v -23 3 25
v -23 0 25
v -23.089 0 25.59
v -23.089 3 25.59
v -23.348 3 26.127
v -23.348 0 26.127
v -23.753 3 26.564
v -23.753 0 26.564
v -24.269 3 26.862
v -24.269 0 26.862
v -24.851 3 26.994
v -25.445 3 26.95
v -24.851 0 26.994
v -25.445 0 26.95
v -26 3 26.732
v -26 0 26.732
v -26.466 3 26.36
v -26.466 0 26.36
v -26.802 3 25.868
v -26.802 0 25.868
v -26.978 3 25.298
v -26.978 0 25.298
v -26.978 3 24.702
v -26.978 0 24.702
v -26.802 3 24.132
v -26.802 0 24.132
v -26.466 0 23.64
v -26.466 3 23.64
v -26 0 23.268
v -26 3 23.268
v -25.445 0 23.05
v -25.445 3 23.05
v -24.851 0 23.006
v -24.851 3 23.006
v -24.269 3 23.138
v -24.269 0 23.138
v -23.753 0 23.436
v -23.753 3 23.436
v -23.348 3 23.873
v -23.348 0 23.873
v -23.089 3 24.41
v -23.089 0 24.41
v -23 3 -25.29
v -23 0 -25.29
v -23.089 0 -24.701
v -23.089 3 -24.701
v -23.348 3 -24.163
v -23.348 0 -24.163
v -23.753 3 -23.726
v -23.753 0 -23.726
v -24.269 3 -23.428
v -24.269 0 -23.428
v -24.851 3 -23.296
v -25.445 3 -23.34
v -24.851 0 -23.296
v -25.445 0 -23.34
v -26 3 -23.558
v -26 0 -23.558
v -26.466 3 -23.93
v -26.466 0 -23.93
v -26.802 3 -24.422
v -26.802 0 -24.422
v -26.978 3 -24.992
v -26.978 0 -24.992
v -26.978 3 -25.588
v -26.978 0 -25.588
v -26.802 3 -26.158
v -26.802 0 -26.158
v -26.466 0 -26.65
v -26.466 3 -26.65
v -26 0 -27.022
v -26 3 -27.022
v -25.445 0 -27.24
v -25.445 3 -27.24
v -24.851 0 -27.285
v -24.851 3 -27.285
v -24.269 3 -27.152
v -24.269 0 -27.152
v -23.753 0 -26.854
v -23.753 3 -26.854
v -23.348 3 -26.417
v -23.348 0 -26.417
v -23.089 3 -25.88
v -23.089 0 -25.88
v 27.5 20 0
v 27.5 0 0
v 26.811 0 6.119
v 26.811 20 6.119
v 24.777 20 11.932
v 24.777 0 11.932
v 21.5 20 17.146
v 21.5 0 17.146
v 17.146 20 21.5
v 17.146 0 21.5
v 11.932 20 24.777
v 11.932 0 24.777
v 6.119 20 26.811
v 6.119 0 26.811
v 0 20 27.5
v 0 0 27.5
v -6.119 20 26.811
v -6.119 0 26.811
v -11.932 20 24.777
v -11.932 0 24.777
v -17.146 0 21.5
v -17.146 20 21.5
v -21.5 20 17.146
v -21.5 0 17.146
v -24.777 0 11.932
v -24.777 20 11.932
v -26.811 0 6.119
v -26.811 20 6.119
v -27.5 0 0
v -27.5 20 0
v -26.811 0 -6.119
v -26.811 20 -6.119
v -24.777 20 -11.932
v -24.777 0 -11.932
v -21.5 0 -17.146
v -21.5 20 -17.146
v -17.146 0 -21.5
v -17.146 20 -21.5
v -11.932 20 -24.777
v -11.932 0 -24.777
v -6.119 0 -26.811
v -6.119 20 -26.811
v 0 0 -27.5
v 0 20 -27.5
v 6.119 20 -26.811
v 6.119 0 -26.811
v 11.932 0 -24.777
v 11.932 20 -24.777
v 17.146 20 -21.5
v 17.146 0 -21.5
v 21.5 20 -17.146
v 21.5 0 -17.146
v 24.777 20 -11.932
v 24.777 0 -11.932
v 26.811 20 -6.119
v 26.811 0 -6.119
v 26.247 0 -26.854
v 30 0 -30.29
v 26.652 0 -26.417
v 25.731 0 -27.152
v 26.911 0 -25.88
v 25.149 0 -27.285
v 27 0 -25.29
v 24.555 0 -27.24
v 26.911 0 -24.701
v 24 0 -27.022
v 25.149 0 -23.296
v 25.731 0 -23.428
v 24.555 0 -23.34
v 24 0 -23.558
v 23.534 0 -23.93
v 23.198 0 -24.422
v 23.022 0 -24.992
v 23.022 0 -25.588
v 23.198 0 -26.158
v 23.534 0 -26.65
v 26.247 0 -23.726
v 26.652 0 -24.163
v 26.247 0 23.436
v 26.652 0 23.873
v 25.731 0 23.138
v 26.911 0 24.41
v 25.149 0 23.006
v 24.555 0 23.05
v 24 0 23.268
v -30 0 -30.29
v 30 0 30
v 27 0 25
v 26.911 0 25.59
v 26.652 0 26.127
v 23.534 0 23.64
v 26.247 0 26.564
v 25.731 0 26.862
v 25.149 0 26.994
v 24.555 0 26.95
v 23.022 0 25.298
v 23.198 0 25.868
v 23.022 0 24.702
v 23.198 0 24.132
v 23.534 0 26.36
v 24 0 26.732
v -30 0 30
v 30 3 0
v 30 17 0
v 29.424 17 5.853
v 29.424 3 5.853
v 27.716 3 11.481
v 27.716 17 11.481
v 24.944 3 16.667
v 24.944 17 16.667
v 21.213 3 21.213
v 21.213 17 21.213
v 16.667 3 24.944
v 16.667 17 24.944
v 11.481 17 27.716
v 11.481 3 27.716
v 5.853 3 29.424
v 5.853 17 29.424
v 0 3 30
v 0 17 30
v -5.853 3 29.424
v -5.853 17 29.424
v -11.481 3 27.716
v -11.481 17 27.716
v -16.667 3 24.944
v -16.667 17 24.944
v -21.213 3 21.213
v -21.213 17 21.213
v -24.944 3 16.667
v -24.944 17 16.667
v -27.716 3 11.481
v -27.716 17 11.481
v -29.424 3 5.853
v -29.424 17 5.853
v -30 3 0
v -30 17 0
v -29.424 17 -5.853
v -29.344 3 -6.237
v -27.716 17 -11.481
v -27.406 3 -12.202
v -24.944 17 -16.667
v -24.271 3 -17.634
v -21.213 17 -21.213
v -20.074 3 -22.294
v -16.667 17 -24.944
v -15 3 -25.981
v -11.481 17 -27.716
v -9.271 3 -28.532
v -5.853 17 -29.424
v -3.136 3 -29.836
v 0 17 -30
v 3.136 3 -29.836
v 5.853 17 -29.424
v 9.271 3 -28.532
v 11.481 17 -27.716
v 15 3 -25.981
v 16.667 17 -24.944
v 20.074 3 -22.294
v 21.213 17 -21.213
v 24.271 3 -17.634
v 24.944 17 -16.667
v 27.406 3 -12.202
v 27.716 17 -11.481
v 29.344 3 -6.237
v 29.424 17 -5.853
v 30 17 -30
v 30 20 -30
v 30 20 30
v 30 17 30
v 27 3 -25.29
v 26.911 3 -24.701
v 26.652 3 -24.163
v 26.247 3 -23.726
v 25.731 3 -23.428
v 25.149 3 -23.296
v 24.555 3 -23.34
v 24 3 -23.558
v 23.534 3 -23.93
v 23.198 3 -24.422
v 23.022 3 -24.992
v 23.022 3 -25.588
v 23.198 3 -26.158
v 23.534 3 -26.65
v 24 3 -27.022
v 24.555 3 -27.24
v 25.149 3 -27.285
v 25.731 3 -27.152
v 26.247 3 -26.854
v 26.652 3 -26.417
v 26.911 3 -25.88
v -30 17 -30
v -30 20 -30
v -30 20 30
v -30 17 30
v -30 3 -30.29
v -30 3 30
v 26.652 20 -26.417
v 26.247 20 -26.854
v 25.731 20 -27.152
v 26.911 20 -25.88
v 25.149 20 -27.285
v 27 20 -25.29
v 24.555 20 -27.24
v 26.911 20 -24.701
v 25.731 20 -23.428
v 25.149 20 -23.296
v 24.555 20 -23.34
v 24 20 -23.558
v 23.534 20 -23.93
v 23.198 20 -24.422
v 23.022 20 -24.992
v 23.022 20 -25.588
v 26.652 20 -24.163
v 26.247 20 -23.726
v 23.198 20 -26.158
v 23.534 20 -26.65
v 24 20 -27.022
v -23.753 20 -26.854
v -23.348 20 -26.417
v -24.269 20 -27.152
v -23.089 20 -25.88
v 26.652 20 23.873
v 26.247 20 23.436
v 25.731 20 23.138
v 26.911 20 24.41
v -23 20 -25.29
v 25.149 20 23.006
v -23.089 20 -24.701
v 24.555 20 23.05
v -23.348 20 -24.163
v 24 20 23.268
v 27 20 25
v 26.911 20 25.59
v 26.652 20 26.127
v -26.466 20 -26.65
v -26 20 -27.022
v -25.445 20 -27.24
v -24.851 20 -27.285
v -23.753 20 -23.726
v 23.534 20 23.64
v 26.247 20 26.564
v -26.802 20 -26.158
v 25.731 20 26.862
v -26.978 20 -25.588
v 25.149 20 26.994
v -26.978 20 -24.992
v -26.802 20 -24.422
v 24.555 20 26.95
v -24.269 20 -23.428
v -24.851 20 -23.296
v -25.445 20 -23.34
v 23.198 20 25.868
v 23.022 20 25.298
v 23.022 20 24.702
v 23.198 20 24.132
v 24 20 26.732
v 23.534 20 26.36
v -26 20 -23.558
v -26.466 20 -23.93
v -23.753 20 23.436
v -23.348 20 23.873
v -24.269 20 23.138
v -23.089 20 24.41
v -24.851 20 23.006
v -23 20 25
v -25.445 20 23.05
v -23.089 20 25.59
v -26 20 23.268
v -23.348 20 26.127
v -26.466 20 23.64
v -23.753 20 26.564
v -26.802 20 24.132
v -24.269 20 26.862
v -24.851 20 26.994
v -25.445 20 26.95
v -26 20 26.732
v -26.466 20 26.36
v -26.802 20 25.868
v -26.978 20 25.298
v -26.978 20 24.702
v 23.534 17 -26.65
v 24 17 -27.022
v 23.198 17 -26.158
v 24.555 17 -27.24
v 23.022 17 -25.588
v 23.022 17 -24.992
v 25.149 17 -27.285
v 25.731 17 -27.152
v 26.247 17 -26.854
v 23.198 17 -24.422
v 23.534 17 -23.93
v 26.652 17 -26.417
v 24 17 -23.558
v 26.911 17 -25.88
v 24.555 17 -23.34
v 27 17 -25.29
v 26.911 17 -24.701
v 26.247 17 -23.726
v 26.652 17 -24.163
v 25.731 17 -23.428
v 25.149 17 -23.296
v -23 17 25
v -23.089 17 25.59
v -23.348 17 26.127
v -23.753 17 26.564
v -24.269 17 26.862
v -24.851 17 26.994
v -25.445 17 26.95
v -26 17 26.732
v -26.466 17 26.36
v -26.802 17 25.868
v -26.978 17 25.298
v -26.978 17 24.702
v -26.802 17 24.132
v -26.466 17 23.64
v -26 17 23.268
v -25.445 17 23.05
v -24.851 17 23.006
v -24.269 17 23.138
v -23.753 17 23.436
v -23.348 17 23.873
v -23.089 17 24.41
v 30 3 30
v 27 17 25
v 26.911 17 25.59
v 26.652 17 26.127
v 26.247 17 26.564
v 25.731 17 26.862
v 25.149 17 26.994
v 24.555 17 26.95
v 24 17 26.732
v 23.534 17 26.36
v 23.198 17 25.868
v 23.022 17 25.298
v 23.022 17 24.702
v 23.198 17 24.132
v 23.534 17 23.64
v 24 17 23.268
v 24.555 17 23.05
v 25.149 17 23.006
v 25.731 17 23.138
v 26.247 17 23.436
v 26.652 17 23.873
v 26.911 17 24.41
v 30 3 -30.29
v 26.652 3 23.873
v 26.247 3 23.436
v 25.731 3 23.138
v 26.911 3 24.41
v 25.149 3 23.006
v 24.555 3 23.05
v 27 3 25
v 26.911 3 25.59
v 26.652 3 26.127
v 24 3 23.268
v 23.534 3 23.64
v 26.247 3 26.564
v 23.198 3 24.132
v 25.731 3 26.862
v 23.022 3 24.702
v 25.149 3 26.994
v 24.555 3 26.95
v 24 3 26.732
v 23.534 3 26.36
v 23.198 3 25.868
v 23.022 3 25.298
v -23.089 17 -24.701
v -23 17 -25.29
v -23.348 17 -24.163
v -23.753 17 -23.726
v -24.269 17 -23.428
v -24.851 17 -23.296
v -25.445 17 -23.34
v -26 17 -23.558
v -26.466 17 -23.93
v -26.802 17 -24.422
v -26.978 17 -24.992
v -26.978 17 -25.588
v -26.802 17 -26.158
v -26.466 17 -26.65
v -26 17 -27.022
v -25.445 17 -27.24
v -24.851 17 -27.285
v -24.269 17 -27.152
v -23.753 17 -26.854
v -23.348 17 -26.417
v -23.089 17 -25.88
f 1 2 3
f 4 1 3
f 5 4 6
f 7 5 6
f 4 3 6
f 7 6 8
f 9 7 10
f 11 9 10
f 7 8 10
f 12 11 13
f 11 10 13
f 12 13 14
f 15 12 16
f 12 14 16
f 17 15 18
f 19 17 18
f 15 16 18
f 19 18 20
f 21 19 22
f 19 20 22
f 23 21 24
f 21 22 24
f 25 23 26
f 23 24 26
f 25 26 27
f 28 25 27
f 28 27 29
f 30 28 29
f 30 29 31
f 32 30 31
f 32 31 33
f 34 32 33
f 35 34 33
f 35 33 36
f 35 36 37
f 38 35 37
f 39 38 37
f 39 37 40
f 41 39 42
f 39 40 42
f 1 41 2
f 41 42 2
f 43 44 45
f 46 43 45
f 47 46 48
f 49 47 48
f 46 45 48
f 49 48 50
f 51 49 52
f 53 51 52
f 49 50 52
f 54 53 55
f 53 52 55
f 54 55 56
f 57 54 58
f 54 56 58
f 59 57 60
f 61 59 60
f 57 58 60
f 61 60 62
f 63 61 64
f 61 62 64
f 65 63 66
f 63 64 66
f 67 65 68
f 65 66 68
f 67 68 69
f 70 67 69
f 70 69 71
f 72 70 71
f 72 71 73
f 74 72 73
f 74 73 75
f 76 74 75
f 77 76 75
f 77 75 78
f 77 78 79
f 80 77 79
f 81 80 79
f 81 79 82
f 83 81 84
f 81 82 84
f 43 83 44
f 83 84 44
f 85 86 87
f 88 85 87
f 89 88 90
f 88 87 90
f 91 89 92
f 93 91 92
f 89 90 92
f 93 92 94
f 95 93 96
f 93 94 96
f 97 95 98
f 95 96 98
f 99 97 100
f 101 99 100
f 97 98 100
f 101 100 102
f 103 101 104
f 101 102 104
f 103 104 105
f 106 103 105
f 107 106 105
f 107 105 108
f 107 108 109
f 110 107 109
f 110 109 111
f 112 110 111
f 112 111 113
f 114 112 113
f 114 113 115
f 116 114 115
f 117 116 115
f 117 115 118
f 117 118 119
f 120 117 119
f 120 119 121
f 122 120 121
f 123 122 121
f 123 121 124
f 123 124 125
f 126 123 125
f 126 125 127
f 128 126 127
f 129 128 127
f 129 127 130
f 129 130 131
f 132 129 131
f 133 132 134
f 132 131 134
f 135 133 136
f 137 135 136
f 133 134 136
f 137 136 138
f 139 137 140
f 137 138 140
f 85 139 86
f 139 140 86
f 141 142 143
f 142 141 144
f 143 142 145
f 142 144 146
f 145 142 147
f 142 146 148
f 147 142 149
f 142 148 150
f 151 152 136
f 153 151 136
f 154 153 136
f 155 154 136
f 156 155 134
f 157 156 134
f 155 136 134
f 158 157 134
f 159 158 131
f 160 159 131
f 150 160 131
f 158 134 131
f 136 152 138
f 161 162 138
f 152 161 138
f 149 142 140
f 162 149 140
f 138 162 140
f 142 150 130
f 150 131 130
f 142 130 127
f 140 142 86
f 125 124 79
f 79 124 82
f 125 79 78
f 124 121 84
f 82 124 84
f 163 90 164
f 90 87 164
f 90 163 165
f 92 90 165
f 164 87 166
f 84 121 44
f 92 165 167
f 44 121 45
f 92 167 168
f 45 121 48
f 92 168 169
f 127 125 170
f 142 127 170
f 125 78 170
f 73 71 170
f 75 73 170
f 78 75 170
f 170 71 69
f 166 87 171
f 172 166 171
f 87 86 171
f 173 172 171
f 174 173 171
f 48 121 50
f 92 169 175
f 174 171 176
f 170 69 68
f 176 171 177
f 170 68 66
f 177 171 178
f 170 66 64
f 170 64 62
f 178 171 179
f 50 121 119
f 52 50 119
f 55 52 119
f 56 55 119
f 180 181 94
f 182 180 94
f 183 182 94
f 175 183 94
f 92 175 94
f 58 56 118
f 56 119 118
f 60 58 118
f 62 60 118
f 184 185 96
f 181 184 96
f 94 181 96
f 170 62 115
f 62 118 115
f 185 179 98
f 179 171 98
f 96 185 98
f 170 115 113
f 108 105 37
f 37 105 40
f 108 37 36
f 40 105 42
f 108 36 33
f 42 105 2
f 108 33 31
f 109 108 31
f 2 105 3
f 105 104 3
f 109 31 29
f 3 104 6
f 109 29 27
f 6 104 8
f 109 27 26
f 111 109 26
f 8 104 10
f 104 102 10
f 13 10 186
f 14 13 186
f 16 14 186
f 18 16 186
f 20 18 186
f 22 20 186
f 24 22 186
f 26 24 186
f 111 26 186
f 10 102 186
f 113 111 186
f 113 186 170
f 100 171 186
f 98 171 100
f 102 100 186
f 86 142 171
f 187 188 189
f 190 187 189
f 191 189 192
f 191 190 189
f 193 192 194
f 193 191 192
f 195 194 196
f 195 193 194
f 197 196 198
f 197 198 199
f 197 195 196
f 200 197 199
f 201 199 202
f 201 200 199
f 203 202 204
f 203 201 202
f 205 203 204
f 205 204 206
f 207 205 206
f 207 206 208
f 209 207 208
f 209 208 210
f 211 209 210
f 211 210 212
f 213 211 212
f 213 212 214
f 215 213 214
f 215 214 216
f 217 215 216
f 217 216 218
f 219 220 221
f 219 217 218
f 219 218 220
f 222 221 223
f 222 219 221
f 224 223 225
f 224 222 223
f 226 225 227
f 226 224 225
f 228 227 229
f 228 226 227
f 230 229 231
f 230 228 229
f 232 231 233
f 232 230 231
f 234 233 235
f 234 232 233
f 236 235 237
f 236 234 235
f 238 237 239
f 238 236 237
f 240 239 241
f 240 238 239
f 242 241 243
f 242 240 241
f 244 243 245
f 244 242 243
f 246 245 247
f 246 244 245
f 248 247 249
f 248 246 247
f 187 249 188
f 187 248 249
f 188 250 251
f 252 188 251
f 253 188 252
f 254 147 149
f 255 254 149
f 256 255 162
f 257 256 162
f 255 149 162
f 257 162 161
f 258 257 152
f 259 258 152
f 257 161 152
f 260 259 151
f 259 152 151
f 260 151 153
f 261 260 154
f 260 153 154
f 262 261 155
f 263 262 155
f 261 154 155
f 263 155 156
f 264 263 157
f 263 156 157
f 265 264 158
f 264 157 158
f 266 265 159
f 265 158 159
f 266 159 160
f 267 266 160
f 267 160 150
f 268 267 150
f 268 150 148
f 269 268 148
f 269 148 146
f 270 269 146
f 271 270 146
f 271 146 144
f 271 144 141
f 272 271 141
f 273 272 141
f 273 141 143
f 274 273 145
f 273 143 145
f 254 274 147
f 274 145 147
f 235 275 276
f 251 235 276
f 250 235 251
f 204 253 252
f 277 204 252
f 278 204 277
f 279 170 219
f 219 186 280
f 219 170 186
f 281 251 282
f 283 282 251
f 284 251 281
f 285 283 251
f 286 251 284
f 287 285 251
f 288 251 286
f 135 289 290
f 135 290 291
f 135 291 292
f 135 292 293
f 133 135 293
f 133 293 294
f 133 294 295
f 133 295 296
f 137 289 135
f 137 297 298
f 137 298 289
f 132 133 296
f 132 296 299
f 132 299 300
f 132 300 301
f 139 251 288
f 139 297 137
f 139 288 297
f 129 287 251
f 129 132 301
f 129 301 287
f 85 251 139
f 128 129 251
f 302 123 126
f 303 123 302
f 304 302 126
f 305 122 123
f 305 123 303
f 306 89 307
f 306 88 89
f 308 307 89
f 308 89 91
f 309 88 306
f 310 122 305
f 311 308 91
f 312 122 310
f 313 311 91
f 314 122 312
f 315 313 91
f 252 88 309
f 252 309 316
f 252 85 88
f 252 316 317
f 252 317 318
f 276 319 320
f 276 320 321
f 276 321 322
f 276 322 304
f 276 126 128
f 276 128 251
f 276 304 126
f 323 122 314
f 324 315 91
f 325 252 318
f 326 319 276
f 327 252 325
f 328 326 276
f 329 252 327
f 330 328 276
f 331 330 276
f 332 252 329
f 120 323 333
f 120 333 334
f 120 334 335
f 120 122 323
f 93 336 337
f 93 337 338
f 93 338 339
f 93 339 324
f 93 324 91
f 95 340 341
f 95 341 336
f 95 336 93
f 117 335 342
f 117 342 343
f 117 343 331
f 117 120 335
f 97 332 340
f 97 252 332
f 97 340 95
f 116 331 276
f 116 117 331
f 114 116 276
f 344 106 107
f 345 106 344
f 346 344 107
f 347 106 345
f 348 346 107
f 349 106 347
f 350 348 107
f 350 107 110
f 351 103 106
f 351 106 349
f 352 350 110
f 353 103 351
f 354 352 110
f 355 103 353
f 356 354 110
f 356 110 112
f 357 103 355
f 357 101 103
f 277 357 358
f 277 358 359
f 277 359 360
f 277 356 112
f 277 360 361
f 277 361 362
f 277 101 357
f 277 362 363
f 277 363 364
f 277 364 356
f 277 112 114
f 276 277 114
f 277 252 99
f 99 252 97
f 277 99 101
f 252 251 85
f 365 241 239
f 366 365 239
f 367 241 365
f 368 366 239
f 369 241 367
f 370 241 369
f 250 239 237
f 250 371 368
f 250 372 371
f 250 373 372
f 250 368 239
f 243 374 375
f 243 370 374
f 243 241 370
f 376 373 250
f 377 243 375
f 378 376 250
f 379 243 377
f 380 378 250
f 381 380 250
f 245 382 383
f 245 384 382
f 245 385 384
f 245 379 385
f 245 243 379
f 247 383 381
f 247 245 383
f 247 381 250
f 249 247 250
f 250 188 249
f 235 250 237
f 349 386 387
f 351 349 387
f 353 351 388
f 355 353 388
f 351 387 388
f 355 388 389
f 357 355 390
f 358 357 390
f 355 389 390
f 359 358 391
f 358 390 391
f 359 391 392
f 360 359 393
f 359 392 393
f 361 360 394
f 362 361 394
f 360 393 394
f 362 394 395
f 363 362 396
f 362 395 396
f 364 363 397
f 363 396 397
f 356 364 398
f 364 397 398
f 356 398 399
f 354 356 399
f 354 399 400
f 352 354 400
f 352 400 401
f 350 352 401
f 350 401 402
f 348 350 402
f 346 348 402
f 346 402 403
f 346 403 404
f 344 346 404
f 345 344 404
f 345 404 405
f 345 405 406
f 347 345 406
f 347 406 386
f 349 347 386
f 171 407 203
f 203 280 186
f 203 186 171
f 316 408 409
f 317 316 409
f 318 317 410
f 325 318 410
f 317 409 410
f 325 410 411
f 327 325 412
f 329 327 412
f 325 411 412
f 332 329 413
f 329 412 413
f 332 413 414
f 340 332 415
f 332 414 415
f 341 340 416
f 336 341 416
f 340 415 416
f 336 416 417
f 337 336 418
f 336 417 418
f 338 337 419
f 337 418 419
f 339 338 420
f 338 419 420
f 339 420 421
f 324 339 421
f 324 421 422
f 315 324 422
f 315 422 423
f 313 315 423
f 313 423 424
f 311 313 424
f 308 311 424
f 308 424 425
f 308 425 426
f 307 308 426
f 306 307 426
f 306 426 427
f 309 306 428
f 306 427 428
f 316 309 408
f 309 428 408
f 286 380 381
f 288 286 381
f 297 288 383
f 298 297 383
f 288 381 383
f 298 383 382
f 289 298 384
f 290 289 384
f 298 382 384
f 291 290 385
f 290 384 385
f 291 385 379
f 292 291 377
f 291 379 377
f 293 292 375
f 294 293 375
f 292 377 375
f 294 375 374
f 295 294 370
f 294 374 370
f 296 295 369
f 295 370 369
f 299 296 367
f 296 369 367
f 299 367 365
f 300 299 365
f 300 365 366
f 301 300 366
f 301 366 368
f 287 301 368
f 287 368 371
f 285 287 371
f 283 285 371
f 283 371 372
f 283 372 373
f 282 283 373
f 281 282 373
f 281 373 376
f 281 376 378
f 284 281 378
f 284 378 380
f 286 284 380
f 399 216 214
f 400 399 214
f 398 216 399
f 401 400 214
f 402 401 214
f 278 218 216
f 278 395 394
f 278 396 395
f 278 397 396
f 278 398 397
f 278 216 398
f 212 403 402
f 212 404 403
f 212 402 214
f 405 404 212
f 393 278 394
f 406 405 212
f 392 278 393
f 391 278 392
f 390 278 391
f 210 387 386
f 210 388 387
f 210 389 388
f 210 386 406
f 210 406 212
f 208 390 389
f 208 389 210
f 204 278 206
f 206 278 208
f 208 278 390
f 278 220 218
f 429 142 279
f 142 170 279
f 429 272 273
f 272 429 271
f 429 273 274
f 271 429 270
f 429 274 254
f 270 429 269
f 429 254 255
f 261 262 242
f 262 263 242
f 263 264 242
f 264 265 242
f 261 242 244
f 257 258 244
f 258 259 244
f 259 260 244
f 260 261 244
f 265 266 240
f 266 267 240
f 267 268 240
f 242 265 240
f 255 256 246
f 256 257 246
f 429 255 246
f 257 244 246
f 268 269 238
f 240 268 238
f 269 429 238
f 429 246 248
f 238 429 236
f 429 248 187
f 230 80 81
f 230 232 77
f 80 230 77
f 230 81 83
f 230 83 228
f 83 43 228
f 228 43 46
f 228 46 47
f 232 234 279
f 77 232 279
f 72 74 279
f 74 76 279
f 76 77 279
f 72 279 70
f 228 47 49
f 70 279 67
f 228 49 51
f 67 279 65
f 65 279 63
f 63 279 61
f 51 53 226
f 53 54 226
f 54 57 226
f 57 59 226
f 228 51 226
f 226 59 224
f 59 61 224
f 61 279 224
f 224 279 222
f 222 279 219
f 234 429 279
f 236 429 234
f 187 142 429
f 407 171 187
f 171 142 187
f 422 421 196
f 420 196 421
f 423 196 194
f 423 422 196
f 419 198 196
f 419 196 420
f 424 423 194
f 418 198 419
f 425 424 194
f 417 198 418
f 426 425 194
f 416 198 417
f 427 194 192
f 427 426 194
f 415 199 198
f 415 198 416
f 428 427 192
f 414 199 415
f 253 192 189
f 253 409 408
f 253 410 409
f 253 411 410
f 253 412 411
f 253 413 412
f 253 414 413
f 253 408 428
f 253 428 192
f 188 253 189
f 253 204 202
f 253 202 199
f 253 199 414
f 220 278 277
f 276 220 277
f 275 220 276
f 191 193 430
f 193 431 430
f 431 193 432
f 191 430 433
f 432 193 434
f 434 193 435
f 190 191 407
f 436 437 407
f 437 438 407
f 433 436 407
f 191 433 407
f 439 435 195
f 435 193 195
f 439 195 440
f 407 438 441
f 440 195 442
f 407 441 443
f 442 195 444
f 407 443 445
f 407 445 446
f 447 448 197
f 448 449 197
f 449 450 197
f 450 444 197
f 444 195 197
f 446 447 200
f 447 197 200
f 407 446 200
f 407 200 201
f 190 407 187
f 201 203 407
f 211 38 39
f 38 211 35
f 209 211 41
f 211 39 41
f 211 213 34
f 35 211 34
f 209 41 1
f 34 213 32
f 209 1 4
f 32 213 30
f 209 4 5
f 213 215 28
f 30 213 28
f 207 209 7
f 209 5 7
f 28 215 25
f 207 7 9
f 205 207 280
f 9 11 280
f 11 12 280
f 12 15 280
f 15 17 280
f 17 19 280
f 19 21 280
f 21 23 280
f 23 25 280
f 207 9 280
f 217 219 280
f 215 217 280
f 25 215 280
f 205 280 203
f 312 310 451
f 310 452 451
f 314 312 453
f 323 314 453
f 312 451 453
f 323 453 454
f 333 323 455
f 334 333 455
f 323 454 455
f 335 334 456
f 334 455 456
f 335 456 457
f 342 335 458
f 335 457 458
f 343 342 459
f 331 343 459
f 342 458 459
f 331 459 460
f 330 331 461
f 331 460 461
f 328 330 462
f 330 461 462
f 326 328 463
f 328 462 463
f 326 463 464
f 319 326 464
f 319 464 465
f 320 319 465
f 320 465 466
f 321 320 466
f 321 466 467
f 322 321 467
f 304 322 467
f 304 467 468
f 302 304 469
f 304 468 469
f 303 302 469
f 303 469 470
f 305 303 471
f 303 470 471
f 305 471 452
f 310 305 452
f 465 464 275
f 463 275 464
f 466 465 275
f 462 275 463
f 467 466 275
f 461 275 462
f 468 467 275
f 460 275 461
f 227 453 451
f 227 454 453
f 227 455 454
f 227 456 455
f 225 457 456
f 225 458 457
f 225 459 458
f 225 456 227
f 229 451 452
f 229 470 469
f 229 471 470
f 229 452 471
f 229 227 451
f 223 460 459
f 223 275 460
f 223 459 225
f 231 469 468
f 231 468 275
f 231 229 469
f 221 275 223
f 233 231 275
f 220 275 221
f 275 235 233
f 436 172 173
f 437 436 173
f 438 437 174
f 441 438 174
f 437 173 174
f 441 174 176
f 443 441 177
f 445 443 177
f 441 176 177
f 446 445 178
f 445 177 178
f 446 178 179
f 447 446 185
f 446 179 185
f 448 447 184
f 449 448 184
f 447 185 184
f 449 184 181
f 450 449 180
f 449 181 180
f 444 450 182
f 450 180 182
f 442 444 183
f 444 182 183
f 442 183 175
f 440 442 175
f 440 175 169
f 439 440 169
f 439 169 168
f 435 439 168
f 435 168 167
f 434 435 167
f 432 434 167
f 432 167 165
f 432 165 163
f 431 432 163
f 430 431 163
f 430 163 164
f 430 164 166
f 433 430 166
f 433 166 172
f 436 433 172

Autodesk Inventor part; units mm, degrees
ref_plane "YZ Plane" through (0, 0, 0) normal (1, 0, 0) x (0, 1, 0)
ref_plane "XZ Plane" through (0, 0, 0) normal (0, 1, 0) x (-1, 0, 0)
ref_plane "XY Plane" through (0, 0, 0) normal (0, 0, 1) x (1, 0, 0)
sketch "Sketch1" plane through (0, 0, 0) normal (0, 1, 0) x (-1, 0, 0)
  line L0 (30, -30) -> (-30, -30)
  line L1 (-30, -30) -> (-30, 30)
  line L2 (-30, 30) -> (30, 30)
  line L3 (30, 30) -> (30, -30)
  line L4 (30, -30) -> (-30, 30) construction
  line L5 (-30, -30) -> (30, 30) construction
  point P0 (0, 0)
  dimension "d0" = 60
  dimension "d1" = 60
extrude "Extrusion1" add sketch "Sketch1" along normal blind 20
sketch "Sketch2" plane through (0, 0, 0) normal (0, -1, 0) x (1, 0, 0)
  circle A0 centre (0, 0) radius 27.5
  dimension "d4" = 55
extrude "Extrusion2" cut sketch "Sketch2" against normal blind 20
sketch "Sketch3" plane through (0, 0, 0) normal (0, -1, 0) x (1, 0, 0)
  circle A0 centre (0, 0) radius 30
  line L0 (-30, -30) -> (30, -30)
  line L1 (30, -30) -> (30, 30)
  line L2 (30, 30) -> (-30, 30)
  line L3 (-30, 30) -> (-30, -30)
  line L4 (-30, -30) -> (30, 30) construction
  line L5 (30, -30) -> (-30, 30) construction
extrude "Extrusion3" cut sketch "Sketch3" against normal blind 17 contours L1 L0 A0 | A0 L2 L1 | A0 L3 L2 | L0 L3 A0
sketch "Sketch4" plane through (0, 0, 0) normal (1, 0, 0) x (0, 1, 0)
  line L0 (0, 30) -> (0, -30) projected
  line L1 (0, -30.2901) -> (3, -30.2901)
  line L2 (3, -30.2901) -> (3, 30)
  line L3 (3, 30) -> (0, 30)
  line L4 (0, 30) -> (0, -30.2901)
  point P0 (0, 0)
  dimension "d9" = 3
extrude "Extrusion4" add sketch "Sketch4" along normal mid plane 60
sketch "Sketch5" plane through (0, 0, 0) normal (0, -1, 0) x (1, 0, 0)
  circle A0 centre (0, 0) radius 27.5
extrude "Extrusion5" cut sketch "Sketch5" against normal blind 60
sketch "Sketch6" plane through (0, 0, 0) normal (0, -1, 0) x (1, 0, 0)
  circle A0 centre (25, -25.2901) radius 2
  circle A1 centre (-25, -25.2901) radius 2
  circle A2 centre (-25, 25) radius 2
  circle A3 centre (25, 25) radius 2
  line L0 (30, 30) -> (30, -30.2901) projected
  line L1 (-30, 30) -> (30, 30) projected
  line L2 (30, -30.2901) -> (-30, -30.2901) projected
  line L3 (-30, -30.2901) -> (-30, 30) projected
  point P0 (0, 0)
  dimension "d14" = 4
  dimension "d15" = 4
  dimension "d16" = 4
  dimension "d17" = 4
  dimension "d18" = 5
  dimension "d19" = 5
  dimension "d20" = 5
  dimension "d21" = 5
  dimension "d22" = 5
  dimension "d23" = 5
  dimension "d24" = 5
  dimension "d25" = 5
extrude "Extrusion6" cut sketch "Sketch6" against normal blind 60 keep common part
properties part number "ventilator"
